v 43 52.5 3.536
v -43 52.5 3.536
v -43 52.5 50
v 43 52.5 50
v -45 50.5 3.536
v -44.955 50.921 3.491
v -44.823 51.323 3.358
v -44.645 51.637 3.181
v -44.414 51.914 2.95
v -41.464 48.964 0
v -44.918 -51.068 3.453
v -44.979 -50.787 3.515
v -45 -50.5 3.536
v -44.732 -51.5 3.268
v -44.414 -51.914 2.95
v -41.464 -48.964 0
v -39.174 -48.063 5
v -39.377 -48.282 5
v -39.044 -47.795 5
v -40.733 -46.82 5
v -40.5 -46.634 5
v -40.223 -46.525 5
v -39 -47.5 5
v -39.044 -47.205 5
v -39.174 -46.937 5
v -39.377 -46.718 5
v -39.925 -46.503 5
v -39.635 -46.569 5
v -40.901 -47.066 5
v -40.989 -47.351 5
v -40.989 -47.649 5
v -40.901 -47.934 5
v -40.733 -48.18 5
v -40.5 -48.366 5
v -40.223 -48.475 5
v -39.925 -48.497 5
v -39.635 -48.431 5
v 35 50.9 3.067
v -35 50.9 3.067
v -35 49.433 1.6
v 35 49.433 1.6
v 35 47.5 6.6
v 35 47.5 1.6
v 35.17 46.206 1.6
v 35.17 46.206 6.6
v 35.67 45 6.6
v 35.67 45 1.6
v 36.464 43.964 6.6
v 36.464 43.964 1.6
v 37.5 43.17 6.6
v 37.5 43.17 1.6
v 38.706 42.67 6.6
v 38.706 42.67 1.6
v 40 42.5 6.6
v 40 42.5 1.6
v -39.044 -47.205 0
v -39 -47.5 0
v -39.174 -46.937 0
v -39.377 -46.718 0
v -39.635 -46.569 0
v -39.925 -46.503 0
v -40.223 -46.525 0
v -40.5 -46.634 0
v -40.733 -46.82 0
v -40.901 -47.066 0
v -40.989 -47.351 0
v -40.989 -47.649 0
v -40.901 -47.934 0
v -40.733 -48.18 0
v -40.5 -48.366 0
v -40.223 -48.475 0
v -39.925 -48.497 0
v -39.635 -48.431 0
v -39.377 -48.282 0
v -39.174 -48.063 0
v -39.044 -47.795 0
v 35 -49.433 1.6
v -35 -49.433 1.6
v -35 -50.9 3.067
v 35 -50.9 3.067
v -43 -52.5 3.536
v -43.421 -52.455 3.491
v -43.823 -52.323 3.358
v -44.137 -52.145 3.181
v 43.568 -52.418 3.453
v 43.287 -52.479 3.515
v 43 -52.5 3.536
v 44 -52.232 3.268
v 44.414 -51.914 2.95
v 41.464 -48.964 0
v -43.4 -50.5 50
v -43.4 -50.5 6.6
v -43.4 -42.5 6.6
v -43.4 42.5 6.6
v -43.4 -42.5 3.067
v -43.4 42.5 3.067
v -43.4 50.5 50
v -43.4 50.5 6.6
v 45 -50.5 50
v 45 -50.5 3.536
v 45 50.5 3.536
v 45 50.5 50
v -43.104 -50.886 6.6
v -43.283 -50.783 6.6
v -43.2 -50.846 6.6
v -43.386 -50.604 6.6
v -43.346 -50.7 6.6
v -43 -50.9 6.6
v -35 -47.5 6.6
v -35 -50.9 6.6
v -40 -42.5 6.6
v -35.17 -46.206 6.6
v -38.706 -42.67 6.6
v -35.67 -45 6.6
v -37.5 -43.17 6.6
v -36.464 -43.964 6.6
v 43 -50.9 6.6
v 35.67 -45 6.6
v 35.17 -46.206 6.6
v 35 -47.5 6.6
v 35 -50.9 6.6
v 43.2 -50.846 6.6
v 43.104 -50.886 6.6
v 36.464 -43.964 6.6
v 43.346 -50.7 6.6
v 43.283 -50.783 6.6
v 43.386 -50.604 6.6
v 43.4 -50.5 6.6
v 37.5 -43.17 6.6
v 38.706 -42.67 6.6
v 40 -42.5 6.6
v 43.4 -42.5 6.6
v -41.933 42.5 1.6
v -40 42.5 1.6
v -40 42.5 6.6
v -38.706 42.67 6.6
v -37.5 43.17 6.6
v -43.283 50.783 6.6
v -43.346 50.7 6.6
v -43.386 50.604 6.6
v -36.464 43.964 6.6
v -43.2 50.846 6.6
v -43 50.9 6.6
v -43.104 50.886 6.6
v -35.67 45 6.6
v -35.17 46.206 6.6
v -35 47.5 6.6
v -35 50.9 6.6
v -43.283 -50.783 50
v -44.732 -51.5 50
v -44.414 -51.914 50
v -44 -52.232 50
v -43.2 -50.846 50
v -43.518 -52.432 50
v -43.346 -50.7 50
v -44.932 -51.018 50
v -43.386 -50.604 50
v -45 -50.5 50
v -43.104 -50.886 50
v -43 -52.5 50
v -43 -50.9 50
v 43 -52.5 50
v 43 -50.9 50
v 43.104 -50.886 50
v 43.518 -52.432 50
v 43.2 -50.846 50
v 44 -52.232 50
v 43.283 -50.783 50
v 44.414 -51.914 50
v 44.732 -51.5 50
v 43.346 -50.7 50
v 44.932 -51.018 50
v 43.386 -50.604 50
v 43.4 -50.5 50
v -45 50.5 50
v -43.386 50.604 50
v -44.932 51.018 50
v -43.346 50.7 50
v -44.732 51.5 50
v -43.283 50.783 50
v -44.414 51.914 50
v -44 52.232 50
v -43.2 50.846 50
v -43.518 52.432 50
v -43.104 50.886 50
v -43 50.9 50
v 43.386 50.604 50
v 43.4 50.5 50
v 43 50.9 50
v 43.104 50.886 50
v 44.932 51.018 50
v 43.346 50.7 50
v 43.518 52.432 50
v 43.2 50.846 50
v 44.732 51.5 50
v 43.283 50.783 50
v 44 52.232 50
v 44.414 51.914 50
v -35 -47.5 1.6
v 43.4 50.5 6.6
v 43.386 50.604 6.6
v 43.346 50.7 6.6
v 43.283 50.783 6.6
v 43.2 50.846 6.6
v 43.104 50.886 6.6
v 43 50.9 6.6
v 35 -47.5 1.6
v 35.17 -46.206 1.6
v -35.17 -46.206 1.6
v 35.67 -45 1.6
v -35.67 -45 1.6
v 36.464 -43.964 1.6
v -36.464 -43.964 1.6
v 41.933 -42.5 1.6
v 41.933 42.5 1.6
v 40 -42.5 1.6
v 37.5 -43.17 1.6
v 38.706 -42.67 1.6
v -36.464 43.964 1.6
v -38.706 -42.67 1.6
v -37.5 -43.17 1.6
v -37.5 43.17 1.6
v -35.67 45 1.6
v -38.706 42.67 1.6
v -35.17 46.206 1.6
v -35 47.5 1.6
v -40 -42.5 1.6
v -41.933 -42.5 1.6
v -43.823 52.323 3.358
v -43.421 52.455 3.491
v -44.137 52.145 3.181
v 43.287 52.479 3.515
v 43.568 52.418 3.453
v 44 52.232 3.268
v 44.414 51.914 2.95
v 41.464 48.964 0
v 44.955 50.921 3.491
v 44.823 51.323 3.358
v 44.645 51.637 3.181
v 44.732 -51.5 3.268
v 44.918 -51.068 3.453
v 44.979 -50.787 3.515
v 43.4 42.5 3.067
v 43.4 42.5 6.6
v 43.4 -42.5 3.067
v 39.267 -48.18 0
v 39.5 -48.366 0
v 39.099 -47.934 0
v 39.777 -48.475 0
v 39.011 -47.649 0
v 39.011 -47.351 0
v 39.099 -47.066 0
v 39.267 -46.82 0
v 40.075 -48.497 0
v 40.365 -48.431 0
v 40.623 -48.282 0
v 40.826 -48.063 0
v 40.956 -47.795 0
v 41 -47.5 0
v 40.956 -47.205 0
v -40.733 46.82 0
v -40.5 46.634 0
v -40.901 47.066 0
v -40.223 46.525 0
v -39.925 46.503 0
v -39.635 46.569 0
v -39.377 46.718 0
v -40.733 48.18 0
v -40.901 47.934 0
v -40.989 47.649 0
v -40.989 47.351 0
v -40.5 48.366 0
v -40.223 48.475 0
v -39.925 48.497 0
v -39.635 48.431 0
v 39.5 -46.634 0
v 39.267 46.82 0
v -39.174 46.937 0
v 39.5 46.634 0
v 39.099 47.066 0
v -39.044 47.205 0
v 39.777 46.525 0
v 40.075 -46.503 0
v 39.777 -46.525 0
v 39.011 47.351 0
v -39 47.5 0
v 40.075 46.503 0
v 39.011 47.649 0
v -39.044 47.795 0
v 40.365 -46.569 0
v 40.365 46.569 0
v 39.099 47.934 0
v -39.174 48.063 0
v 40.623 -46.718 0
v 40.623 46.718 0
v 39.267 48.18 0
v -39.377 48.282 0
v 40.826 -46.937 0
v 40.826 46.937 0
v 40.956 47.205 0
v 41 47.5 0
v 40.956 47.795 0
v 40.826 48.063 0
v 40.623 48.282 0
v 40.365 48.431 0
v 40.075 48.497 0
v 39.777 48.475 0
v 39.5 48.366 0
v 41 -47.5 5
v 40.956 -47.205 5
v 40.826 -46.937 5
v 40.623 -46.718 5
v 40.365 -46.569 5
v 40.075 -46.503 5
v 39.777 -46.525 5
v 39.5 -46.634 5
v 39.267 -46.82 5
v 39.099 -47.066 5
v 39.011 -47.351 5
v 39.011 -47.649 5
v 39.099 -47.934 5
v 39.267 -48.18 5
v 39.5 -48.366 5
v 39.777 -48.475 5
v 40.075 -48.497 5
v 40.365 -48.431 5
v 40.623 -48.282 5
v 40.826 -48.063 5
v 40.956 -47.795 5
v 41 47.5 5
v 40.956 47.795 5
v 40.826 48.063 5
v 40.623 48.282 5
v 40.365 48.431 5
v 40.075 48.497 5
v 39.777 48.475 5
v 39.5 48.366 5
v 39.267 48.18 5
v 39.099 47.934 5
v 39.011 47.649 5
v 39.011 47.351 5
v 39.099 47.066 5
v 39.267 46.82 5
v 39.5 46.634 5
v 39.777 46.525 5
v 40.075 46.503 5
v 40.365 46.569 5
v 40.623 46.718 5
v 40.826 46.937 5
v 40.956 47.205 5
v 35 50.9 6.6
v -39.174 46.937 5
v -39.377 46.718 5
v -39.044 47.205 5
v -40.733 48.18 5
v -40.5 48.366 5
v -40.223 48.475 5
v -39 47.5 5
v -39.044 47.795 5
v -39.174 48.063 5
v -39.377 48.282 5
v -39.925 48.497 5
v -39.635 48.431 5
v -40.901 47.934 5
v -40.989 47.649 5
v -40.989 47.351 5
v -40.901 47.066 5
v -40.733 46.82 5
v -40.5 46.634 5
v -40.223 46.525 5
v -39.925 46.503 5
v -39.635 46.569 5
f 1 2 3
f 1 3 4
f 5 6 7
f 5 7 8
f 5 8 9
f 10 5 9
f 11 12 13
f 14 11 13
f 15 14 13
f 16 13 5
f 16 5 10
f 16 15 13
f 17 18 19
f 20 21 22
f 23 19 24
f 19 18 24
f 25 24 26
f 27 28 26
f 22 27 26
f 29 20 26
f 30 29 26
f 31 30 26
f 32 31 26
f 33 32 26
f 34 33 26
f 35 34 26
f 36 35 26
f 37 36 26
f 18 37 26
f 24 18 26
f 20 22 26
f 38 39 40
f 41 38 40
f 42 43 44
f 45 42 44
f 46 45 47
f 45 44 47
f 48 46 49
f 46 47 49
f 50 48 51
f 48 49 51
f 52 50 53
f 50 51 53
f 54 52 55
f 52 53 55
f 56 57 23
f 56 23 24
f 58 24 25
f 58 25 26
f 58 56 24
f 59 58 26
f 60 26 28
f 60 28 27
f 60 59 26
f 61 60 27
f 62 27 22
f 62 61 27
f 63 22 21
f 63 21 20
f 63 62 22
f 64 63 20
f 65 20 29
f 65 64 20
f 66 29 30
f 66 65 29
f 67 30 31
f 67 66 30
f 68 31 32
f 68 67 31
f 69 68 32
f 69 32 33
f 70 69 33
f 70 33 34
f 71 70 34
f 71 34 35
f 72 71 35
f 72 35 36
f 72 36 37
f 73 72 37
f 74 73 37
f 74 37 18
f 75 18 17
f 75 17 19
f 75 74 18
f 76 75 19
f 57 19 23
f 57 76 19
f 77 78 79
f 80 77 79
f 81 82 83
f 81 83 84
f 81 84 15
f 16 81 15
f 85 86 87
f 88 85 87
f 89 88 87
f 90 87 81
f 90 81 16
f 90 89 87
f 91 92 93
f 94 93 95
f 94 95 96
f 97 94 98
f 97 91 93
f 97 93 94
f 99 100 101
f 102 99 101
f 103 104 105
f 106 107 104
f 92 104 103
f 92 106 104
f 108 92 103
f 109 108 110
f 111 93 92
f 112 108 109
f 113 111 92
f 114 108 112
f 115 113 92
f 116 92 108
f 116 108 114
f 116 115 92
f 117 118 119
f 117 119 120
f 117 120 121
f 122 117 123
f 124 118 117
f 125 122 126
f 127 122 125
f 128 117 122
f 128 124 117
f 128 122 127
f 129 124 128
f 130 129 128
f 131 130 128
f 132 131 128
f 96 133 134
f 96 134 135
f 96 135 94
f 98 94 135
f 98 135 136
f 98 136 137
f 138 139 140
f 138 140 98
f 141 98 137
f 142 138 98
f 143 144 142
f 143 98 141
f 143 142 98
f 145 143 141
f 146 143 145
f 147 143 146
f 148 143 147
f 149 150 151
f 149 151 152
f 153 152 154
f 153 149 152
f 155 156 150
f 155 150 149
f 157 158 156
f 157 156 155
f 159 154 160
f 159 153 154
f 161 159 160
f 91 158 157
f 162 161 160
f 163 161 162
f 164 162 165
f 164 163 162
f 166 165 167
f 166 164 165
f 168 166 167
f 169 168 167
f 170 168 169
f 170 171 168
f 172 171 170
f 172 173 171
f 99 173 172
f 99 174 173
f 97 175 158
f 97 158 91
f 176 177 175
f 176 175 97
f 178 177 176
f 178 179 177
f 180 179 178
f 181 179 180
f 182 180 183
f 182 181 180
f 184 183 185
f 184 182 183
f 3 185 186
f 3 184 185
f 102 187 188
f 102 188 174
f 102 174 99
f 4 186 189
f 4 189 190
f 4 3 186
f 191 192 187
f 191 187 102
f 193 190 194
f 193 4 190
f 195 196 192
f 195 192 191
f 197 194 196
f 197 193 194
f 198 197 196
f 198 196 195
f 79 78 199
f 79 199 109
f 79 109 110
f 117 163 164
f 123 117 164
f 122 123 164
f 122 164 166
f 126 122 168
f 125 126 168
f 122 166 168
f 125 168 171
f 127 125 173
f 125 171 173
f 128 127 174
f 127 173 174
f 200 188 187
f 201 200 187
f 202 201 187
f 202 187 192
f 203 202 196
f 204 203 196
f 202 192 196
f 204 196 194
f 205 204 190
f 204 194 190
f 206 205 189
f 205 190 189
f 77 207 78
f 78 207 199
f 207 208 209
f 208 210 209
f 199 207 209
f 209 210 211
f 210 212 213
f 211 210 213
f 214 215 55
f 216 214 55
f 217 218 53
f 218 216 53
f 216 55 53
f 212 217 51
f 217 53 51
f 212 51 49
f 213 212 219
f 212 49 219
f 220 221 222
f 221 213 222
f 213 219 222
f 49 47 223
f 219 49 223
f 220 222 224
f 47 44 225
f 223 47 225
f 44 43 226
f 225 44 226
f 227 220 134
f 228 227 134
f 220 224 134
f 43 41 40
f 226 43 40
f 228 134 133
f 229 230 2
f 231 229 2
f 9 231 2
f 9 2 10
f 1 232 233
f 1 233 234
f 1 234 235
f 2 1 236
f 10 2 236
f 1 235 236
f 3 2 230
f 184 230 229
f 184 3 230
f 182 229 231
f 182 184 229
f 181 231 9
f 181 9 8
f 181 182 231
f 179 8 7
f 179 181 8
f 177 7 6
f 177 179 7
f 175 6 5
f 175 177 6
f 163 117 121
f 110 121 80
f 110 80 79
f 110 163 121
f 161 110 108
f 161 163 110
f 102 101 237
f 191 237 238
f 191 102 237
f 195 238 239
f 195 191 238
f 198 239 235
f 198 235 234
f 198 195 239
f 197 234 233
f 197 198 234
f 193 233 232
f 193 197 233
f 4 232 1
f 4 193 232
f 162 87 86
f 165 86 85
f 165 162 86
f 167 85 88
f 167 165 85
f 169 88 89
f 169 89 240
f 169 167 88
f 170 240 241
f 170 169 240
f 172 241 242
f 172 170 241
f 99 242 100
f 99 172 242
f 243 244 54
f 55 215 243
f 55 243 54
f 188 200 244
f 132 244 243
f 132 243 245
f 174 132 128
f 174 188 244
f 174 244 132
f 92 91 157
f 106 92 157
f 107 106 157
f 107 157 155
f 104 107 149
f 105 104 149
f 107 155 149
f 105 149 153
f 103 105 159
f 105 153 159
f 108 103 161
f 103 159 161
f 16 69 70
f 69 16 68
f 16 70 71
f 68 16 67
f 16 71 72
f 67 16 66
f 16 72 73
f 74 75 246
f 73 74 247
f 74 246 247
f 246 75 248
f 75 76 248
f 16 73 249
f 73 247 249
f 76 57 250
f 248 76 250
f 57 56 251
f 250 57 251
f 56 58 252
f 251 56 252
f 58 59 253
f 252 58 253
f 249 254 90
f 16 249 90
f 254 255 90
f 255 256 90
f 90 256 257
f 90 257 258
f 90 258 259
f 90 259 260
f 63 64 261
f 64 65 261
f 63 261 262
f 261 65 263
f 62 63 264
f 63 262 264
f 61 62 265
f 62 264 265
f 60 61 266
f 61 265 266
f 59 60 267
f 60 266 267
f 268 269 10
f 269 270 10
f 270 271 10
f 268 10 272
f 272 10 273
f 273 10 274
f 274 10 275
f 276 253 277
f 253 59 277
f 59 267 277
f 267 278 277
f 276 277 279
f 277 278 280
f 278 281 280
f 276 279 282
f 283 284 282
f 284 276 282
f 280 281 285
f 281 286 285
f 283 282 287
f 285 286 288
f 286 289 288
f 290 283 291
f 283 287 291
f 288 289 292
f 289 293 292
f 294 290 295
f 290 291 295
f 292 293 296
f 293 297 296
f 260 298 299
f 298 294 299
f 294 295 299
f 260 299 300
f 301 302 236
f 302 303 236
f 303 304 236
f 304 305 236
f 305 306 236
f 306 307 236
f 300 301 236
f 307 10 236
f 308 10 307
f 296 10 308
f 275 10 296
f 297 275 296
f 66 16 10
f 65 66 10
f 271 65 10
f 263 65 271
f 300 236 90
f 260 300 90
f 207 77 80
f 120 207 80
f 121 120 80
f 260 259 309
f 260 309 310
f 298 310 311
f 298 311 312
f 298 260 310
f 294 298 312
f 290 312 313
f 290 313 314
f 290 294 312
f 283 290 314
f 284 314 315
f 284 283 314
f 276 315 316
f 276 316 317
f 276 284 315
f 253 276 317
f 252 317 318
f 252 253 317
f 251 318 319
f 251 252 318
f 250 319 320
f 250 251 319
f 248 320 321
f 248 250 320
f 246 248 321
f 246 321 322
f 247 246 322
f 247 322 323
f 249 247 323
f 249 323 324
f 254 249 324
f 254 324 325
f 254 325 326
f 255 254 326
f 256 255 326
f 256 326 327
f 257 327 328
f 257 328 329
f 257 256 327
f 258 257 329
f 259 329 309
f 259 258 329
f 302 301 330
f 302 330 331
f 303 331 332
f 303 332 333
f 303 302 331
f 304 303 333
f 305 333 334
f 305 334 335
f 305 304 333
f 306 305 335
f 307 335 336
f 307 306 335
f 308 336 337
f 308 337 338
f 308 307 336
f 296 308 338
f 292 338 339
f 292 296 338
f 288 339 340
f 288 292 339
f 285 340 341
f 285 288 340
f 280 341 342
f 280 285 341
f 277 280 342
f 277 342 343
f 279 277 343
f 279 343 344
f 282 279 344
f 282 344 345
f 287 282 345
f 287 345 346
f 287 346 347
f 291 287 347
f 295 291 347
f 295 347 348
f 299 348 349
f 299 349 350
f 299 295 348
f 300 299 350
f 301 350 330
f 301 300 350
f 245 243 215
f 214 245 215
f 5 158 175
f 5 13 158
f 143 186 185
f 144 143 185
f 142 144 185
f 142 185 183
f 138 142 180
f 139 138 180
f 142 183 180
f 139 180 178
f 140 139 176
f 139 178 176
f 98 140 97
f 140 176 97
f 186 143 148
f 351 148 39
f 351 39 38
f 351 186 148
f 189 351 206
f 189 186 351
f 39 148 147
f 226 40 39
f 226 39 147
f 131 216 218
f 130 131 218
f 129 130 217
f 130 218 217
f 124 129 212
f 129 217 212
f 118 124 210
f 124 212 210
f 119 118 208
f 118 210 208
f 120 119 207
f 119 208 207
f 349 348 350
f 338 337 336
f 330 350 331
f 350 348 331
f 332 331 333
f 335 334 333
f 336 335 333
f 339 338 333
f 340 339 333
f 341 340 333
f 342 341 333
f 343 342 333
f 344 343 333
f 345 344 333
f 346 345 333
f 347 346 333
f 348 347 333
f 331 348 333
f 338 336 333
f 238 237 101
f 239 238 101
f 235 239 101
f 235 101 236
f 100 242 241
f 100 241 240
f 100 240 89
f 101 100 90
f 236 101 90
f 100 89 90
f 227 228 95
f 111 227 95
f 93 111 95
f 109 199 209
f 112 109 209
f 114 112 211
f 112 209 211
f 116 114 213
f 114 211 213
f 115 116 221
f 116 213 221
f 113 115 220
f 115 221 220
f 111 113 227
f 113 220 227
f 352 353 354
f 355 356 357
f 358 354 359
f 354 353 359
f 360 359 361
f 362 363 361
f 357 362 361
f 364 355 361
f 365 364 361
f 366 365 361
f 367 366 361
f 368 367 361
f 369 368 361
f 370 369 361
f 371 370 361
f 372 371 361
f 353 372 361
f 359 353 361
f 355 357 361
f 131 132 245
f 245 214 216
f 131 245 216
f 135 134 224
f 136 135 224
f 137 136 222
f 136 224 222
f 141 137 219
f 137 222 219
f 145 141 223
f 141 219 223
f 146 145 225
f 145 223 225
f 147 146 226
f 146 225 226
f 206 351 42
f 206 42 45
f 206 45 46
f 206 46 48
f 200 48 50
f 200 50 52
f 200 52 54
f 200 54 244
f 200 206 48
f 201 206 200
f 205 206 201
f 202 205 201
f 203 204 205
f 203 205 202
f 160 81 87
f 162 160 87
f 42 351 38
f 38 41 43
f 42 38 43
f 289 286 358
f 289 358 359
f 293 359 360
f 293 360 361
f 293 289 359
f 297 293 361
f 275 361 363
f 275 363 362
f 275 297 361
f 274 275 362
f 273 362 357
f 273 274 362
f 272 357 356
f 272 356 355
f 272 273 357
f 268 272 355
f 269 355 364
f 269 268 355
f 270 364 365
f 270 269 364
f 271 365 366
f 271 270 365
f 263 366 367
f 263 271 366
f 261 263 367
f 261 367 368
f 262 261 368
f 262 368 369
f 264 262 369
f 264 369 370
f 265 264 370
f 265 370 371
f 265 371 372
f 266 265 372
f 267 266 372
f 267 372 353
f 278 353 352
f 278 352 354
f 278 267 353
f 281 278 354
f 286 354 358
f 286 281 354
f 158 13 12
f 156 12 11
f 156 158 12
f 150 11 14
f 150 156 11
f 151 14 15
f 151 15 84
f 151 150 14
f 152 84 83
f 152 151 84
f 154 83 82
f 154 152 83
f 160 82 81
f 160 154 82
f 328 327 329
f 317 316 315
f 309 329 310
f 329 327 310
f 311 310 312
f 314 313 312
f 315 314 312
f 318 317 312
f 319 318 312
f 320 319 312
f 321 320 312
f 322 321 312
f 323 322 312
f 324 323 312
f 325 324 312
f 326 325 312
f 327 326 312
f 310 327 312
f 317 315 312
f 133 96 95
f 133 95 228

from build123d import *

# Parameters (mm, degrees)
SKETCH_W        = 90
SKETCH_H        = 105
PAD_DEPTH       = 50
POCKET_DEPTH    = 48.4
PAD001_DEPTH    = 105
PAD002_DEPTH    = 90
PAD003_DEPTH    = 6.6
SKETCH008_R     = 1
POCKET004_DEPTH = 5
POCKET001_DEPTH = 105.001
POCKET002_DEPTH = 90.001
POCKET003_DEPTH = 50.001


with BuildPart() as part:
    # Sketch → Pad (new body)
    with BuildSketch(Plane.XY):
        Rectangle(SKETCH_W, SKETCH_H)
    extrude(amount=PAD_DEPTH)

    # Sketch001 (on DatumPlane) → Pocket (cut)
    with BuildSketch(Plane.XY.offset(50)):
        with BuildLine():
            Line((-43, 50.9), (43, 50.9))
            ThreePointArc((43.4, 50.5), (43.282843, 50.782843), (43, 50.9))
            Line((43.4, 50.5), (43.4, -50.5))
            ThreePointArc((43, -50.9), (43.282843, -50.782843), (43.4, -50.5))
            Line((43, -50.9), (-43, -50.9))
            ThreePointArc((-43.4, -50.5), (-43.282843, -50.782843), (-43, -50.9))
            Line((-43.4, -50.5), (-43.4, 50.5))
            ThreePointArc((-43, 50.9), (-43.282843, 50.782843), (-43.4, 50.5))
        make_face()
    extrude(amount=-POCKET_DEPTH, mode=Mode.SUBTRACT)

    # Sketch002 (on DatumPlane) → Pad001 (join)
    with BuildSketch(Plane.XZ.offset(52.5)):
        Polygon((-45, 4.666905), (-40.333095, 0), (-45, 0), align=None)
        Polygon((40.333095, 0), (45, 0), (45, 4.666905), align=None)
    extrude(amount=-PAD001_DEPTH)

    # Sketch003 (on DatumPlane) → Pad002 (join)
    with BuildSketch(Plane.YZ.offset(45)):
        Polygon((-52.5, 4.666905), (-52.5, 0), (-47.833095, 0), align=None)
        Polygon((47.833095, 0), (52.5, 0), (52.5, 4.666905), align=None)
    extrude(amount=-PAD002_DEPTH)

    # Sketch007 → Pad003 (join)
    with BuildSketch(Plane.XY):
        with BuildLine():
            ThreePointArc((-40, 42.5), (-36.464466, 43.964466), (-35, 47.5))
            Line((-35, 52.5), (-35, 47.5))
            Line((-35, 52.5), (-45, 52.5))
            Line((-45, 52.5), (-45, 42.5))
            Line((-40, 42.5), (-45, 42.5))
        make_face()
        with BuildLine():
            ThreePointArc((35, 47.5), (36.464466, 43.964466), (40, 42.5))
            Line((45, 42.5), (40, 42.5))
            Line((45, 52.5), (45, 42.5))
            Line((45, 52.5), (35, 52.5))
            Line((35, 52.5), (35, 47.5))
        make_face()
        with BuildLine():
            ThreePointArc((40, -42.5), (36.464466, -43.964466), (35, -47.5))
            Line((35, -47.5), (35, -52.5))
            Line((45, -52.5), (35, -52.5))
            Line((45, -42.5), (45, -52.5))
            Line((45, -42.5), (40, -42.5))
        make_face()
        with BuildLine():
            ThreePointArc((-35, -47.5), (-36.464466, -43.964466), (-40, -42.5))
            Line((-40, -42.5), (-45, -42.5))
            Line((-45, -42.5), (-45, -52.5))
            Line((-45, -52.5), (-35, -52.5))
            Line((-35, -47.5), (-35, -52.5))
        make_face()
    extrude(amount=PAD003_DEPTH)

    # Sketch008 → Pocket004 (cut)
    with BuildSketch(Plane.XY):
        with Locations((-40, 47.5)):
            Circle(SKETCH008_R)
        with Locations((40, 47.5)):
            Circle(SKETCH008_R)
        with Locations((40, -47.5)):
            Circle(SKETCH008_R)
        with Locations((-40, -47.5)):
            Circle(SKETCH008_R)
    extrude(amount=POCKET004_DEPTH, mode=Mode.SUBTRACT)

    # Sketch004 (on DatumPlane) → Pocket001 (cut, through all)
    with BuildSketch(Plane.XZ.offset(52.5)):
        Polygon((-45, 0), (-45, 3.535534), (-41.464466, 0), align=None)
        Polygon((41.464466, 0), (45, 0), (45, 3.535534), align=None)
    extrude(amount=-POCKET001_DEPTH, mode=Mode.SUBTRACT)

    # Sketch005 (on DatumPlane) → Pocket002 (cut, through all)
    with BuildSketch(Plane.YZ.offset(45)):
        Polygon((-52.5, 0), (-52.5, 3.535534), (-48.964466, 0), align=None)
        Polygon((48.964466, 0), (52.5, 0), (52.5, 3.535534), align=None)
    extrude(amount=-POCKET002_DEPTH, mode=Mode.SUBTRACT)

    # Sketch006 (on DatumPlane) → Pocket003 (cut, through all)
    with BuildSketch(Plane.XY.offset(50)):
        with BuildLine():
            ThreePointArc((-43, 52.5), (-44.414214, 51.914214), (-45, 50.5))
            Line((-45, 52.5), (-45, 50.5))
            Line((-43, 52.5), (-45, 52.5))
        make_face()
        with BuildLine():
            ThreePointArc((45, 50.5), (44.414214, 51.914214), (43, 52.5))
            Line((43, 52.5), (45, 52.5))
            Line((45, 50.5), (45, 52.5))
        make_face()
        with BuildLine():
            ThreePointArc((43, -52.5), (44.414214, -51.914214), (45, -50.5))
            Line((45, -52.5), (45, -50.5))
            Line((43, -52.5), (45, -52.5))
        make_face()
        with BuildLine():
            ThreePointArc((-45, -50.5), (-44.414214, -51.914214), (-43, -52.5))
            Line((-45, -52.5), (-43, -52.5))
            Line((-45, -50.5), (-45, -52.5))
        make_face()
    extrude(amount=-POCKET003_DEPTH, mode=Mode.SUBTRACT)


solid = part.part
